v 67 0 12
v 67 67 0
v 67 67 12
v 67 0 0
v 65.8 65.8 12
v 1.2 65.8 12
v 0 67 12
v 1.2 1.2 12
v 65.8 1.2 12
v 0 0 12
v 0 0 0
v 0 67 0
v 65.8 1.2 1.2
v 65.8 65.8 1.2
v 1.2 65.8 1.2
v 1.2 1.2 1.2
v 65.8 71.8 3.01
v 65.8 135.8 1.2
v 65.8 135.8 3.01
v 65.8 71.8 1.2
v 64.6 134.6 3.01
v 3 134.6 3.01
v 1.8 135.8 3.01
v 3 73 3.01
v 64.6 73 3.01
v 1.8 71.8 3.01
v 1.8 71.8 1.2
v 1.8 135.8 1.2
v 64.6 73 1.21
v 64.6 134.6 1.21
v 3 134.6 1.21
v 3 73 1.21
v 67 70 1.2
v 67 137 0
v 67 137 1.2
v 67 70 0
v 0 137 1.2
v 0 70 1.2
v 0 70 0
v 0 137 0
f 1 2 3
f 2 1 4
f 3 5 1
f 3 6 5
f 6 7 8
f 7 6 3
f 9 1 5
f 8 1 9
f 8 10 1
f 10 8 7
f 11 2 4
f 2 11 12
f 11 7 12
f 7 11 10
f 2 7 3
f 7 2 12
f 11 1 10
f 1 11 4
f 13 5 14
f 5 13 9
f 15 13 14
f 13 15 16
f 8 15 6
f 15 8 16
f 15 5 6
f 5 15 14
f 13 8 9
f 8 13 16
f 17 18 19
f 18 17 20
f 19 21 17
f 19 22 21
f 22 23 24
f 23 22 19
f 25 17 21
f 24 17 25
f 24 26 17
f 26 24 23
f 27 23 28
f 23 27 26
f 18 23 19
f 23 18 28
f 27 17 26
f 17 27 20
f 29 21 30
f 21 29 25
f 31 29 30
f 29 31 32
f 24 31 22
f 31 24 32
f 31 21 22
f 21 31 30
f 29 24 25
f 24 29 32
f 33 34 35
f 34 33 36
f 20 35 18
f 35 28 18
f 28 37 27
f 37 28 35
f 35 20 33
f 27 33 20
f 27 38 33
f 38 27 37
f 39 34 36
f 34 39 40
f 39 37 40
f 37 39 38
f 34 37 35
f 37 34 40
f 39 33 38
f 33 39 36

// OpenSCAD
wallSize = 1.2;
overlapSize = 0.6;
sideSize = 67;

boxCoverSideSize = sideSize-(2*wallSize+overlapSize);
echo("Box cover side size ", boxCoverSideSize); 

union(){
    emptyBox(sideSize, sideSize, 12, 1.2);
    translate([0,70,0]) boxCover(sideSize, sideSize, 1.2, overlapSize);
}

module emptyBox(side1, side2, height, wall){
    difference(){
        cube([side1,side2,height]);
        translate([wall,wall,wall]) cube([side1-2*wall,side2-2*wall,height]);
        echo("Empty box size: ", side1-2*wall, " ", side2-2*wall);
    }
}

module boxCover(side1, side2, wall, overlap){
    union(){
        cube([side1, side2, wall]);
        translate([(wall+overlap), (wall+overlap), .01]) emptyBox(side1-(2*wall+overlap), side2-(2*wall+overlap), 3, wall);
    }
}
